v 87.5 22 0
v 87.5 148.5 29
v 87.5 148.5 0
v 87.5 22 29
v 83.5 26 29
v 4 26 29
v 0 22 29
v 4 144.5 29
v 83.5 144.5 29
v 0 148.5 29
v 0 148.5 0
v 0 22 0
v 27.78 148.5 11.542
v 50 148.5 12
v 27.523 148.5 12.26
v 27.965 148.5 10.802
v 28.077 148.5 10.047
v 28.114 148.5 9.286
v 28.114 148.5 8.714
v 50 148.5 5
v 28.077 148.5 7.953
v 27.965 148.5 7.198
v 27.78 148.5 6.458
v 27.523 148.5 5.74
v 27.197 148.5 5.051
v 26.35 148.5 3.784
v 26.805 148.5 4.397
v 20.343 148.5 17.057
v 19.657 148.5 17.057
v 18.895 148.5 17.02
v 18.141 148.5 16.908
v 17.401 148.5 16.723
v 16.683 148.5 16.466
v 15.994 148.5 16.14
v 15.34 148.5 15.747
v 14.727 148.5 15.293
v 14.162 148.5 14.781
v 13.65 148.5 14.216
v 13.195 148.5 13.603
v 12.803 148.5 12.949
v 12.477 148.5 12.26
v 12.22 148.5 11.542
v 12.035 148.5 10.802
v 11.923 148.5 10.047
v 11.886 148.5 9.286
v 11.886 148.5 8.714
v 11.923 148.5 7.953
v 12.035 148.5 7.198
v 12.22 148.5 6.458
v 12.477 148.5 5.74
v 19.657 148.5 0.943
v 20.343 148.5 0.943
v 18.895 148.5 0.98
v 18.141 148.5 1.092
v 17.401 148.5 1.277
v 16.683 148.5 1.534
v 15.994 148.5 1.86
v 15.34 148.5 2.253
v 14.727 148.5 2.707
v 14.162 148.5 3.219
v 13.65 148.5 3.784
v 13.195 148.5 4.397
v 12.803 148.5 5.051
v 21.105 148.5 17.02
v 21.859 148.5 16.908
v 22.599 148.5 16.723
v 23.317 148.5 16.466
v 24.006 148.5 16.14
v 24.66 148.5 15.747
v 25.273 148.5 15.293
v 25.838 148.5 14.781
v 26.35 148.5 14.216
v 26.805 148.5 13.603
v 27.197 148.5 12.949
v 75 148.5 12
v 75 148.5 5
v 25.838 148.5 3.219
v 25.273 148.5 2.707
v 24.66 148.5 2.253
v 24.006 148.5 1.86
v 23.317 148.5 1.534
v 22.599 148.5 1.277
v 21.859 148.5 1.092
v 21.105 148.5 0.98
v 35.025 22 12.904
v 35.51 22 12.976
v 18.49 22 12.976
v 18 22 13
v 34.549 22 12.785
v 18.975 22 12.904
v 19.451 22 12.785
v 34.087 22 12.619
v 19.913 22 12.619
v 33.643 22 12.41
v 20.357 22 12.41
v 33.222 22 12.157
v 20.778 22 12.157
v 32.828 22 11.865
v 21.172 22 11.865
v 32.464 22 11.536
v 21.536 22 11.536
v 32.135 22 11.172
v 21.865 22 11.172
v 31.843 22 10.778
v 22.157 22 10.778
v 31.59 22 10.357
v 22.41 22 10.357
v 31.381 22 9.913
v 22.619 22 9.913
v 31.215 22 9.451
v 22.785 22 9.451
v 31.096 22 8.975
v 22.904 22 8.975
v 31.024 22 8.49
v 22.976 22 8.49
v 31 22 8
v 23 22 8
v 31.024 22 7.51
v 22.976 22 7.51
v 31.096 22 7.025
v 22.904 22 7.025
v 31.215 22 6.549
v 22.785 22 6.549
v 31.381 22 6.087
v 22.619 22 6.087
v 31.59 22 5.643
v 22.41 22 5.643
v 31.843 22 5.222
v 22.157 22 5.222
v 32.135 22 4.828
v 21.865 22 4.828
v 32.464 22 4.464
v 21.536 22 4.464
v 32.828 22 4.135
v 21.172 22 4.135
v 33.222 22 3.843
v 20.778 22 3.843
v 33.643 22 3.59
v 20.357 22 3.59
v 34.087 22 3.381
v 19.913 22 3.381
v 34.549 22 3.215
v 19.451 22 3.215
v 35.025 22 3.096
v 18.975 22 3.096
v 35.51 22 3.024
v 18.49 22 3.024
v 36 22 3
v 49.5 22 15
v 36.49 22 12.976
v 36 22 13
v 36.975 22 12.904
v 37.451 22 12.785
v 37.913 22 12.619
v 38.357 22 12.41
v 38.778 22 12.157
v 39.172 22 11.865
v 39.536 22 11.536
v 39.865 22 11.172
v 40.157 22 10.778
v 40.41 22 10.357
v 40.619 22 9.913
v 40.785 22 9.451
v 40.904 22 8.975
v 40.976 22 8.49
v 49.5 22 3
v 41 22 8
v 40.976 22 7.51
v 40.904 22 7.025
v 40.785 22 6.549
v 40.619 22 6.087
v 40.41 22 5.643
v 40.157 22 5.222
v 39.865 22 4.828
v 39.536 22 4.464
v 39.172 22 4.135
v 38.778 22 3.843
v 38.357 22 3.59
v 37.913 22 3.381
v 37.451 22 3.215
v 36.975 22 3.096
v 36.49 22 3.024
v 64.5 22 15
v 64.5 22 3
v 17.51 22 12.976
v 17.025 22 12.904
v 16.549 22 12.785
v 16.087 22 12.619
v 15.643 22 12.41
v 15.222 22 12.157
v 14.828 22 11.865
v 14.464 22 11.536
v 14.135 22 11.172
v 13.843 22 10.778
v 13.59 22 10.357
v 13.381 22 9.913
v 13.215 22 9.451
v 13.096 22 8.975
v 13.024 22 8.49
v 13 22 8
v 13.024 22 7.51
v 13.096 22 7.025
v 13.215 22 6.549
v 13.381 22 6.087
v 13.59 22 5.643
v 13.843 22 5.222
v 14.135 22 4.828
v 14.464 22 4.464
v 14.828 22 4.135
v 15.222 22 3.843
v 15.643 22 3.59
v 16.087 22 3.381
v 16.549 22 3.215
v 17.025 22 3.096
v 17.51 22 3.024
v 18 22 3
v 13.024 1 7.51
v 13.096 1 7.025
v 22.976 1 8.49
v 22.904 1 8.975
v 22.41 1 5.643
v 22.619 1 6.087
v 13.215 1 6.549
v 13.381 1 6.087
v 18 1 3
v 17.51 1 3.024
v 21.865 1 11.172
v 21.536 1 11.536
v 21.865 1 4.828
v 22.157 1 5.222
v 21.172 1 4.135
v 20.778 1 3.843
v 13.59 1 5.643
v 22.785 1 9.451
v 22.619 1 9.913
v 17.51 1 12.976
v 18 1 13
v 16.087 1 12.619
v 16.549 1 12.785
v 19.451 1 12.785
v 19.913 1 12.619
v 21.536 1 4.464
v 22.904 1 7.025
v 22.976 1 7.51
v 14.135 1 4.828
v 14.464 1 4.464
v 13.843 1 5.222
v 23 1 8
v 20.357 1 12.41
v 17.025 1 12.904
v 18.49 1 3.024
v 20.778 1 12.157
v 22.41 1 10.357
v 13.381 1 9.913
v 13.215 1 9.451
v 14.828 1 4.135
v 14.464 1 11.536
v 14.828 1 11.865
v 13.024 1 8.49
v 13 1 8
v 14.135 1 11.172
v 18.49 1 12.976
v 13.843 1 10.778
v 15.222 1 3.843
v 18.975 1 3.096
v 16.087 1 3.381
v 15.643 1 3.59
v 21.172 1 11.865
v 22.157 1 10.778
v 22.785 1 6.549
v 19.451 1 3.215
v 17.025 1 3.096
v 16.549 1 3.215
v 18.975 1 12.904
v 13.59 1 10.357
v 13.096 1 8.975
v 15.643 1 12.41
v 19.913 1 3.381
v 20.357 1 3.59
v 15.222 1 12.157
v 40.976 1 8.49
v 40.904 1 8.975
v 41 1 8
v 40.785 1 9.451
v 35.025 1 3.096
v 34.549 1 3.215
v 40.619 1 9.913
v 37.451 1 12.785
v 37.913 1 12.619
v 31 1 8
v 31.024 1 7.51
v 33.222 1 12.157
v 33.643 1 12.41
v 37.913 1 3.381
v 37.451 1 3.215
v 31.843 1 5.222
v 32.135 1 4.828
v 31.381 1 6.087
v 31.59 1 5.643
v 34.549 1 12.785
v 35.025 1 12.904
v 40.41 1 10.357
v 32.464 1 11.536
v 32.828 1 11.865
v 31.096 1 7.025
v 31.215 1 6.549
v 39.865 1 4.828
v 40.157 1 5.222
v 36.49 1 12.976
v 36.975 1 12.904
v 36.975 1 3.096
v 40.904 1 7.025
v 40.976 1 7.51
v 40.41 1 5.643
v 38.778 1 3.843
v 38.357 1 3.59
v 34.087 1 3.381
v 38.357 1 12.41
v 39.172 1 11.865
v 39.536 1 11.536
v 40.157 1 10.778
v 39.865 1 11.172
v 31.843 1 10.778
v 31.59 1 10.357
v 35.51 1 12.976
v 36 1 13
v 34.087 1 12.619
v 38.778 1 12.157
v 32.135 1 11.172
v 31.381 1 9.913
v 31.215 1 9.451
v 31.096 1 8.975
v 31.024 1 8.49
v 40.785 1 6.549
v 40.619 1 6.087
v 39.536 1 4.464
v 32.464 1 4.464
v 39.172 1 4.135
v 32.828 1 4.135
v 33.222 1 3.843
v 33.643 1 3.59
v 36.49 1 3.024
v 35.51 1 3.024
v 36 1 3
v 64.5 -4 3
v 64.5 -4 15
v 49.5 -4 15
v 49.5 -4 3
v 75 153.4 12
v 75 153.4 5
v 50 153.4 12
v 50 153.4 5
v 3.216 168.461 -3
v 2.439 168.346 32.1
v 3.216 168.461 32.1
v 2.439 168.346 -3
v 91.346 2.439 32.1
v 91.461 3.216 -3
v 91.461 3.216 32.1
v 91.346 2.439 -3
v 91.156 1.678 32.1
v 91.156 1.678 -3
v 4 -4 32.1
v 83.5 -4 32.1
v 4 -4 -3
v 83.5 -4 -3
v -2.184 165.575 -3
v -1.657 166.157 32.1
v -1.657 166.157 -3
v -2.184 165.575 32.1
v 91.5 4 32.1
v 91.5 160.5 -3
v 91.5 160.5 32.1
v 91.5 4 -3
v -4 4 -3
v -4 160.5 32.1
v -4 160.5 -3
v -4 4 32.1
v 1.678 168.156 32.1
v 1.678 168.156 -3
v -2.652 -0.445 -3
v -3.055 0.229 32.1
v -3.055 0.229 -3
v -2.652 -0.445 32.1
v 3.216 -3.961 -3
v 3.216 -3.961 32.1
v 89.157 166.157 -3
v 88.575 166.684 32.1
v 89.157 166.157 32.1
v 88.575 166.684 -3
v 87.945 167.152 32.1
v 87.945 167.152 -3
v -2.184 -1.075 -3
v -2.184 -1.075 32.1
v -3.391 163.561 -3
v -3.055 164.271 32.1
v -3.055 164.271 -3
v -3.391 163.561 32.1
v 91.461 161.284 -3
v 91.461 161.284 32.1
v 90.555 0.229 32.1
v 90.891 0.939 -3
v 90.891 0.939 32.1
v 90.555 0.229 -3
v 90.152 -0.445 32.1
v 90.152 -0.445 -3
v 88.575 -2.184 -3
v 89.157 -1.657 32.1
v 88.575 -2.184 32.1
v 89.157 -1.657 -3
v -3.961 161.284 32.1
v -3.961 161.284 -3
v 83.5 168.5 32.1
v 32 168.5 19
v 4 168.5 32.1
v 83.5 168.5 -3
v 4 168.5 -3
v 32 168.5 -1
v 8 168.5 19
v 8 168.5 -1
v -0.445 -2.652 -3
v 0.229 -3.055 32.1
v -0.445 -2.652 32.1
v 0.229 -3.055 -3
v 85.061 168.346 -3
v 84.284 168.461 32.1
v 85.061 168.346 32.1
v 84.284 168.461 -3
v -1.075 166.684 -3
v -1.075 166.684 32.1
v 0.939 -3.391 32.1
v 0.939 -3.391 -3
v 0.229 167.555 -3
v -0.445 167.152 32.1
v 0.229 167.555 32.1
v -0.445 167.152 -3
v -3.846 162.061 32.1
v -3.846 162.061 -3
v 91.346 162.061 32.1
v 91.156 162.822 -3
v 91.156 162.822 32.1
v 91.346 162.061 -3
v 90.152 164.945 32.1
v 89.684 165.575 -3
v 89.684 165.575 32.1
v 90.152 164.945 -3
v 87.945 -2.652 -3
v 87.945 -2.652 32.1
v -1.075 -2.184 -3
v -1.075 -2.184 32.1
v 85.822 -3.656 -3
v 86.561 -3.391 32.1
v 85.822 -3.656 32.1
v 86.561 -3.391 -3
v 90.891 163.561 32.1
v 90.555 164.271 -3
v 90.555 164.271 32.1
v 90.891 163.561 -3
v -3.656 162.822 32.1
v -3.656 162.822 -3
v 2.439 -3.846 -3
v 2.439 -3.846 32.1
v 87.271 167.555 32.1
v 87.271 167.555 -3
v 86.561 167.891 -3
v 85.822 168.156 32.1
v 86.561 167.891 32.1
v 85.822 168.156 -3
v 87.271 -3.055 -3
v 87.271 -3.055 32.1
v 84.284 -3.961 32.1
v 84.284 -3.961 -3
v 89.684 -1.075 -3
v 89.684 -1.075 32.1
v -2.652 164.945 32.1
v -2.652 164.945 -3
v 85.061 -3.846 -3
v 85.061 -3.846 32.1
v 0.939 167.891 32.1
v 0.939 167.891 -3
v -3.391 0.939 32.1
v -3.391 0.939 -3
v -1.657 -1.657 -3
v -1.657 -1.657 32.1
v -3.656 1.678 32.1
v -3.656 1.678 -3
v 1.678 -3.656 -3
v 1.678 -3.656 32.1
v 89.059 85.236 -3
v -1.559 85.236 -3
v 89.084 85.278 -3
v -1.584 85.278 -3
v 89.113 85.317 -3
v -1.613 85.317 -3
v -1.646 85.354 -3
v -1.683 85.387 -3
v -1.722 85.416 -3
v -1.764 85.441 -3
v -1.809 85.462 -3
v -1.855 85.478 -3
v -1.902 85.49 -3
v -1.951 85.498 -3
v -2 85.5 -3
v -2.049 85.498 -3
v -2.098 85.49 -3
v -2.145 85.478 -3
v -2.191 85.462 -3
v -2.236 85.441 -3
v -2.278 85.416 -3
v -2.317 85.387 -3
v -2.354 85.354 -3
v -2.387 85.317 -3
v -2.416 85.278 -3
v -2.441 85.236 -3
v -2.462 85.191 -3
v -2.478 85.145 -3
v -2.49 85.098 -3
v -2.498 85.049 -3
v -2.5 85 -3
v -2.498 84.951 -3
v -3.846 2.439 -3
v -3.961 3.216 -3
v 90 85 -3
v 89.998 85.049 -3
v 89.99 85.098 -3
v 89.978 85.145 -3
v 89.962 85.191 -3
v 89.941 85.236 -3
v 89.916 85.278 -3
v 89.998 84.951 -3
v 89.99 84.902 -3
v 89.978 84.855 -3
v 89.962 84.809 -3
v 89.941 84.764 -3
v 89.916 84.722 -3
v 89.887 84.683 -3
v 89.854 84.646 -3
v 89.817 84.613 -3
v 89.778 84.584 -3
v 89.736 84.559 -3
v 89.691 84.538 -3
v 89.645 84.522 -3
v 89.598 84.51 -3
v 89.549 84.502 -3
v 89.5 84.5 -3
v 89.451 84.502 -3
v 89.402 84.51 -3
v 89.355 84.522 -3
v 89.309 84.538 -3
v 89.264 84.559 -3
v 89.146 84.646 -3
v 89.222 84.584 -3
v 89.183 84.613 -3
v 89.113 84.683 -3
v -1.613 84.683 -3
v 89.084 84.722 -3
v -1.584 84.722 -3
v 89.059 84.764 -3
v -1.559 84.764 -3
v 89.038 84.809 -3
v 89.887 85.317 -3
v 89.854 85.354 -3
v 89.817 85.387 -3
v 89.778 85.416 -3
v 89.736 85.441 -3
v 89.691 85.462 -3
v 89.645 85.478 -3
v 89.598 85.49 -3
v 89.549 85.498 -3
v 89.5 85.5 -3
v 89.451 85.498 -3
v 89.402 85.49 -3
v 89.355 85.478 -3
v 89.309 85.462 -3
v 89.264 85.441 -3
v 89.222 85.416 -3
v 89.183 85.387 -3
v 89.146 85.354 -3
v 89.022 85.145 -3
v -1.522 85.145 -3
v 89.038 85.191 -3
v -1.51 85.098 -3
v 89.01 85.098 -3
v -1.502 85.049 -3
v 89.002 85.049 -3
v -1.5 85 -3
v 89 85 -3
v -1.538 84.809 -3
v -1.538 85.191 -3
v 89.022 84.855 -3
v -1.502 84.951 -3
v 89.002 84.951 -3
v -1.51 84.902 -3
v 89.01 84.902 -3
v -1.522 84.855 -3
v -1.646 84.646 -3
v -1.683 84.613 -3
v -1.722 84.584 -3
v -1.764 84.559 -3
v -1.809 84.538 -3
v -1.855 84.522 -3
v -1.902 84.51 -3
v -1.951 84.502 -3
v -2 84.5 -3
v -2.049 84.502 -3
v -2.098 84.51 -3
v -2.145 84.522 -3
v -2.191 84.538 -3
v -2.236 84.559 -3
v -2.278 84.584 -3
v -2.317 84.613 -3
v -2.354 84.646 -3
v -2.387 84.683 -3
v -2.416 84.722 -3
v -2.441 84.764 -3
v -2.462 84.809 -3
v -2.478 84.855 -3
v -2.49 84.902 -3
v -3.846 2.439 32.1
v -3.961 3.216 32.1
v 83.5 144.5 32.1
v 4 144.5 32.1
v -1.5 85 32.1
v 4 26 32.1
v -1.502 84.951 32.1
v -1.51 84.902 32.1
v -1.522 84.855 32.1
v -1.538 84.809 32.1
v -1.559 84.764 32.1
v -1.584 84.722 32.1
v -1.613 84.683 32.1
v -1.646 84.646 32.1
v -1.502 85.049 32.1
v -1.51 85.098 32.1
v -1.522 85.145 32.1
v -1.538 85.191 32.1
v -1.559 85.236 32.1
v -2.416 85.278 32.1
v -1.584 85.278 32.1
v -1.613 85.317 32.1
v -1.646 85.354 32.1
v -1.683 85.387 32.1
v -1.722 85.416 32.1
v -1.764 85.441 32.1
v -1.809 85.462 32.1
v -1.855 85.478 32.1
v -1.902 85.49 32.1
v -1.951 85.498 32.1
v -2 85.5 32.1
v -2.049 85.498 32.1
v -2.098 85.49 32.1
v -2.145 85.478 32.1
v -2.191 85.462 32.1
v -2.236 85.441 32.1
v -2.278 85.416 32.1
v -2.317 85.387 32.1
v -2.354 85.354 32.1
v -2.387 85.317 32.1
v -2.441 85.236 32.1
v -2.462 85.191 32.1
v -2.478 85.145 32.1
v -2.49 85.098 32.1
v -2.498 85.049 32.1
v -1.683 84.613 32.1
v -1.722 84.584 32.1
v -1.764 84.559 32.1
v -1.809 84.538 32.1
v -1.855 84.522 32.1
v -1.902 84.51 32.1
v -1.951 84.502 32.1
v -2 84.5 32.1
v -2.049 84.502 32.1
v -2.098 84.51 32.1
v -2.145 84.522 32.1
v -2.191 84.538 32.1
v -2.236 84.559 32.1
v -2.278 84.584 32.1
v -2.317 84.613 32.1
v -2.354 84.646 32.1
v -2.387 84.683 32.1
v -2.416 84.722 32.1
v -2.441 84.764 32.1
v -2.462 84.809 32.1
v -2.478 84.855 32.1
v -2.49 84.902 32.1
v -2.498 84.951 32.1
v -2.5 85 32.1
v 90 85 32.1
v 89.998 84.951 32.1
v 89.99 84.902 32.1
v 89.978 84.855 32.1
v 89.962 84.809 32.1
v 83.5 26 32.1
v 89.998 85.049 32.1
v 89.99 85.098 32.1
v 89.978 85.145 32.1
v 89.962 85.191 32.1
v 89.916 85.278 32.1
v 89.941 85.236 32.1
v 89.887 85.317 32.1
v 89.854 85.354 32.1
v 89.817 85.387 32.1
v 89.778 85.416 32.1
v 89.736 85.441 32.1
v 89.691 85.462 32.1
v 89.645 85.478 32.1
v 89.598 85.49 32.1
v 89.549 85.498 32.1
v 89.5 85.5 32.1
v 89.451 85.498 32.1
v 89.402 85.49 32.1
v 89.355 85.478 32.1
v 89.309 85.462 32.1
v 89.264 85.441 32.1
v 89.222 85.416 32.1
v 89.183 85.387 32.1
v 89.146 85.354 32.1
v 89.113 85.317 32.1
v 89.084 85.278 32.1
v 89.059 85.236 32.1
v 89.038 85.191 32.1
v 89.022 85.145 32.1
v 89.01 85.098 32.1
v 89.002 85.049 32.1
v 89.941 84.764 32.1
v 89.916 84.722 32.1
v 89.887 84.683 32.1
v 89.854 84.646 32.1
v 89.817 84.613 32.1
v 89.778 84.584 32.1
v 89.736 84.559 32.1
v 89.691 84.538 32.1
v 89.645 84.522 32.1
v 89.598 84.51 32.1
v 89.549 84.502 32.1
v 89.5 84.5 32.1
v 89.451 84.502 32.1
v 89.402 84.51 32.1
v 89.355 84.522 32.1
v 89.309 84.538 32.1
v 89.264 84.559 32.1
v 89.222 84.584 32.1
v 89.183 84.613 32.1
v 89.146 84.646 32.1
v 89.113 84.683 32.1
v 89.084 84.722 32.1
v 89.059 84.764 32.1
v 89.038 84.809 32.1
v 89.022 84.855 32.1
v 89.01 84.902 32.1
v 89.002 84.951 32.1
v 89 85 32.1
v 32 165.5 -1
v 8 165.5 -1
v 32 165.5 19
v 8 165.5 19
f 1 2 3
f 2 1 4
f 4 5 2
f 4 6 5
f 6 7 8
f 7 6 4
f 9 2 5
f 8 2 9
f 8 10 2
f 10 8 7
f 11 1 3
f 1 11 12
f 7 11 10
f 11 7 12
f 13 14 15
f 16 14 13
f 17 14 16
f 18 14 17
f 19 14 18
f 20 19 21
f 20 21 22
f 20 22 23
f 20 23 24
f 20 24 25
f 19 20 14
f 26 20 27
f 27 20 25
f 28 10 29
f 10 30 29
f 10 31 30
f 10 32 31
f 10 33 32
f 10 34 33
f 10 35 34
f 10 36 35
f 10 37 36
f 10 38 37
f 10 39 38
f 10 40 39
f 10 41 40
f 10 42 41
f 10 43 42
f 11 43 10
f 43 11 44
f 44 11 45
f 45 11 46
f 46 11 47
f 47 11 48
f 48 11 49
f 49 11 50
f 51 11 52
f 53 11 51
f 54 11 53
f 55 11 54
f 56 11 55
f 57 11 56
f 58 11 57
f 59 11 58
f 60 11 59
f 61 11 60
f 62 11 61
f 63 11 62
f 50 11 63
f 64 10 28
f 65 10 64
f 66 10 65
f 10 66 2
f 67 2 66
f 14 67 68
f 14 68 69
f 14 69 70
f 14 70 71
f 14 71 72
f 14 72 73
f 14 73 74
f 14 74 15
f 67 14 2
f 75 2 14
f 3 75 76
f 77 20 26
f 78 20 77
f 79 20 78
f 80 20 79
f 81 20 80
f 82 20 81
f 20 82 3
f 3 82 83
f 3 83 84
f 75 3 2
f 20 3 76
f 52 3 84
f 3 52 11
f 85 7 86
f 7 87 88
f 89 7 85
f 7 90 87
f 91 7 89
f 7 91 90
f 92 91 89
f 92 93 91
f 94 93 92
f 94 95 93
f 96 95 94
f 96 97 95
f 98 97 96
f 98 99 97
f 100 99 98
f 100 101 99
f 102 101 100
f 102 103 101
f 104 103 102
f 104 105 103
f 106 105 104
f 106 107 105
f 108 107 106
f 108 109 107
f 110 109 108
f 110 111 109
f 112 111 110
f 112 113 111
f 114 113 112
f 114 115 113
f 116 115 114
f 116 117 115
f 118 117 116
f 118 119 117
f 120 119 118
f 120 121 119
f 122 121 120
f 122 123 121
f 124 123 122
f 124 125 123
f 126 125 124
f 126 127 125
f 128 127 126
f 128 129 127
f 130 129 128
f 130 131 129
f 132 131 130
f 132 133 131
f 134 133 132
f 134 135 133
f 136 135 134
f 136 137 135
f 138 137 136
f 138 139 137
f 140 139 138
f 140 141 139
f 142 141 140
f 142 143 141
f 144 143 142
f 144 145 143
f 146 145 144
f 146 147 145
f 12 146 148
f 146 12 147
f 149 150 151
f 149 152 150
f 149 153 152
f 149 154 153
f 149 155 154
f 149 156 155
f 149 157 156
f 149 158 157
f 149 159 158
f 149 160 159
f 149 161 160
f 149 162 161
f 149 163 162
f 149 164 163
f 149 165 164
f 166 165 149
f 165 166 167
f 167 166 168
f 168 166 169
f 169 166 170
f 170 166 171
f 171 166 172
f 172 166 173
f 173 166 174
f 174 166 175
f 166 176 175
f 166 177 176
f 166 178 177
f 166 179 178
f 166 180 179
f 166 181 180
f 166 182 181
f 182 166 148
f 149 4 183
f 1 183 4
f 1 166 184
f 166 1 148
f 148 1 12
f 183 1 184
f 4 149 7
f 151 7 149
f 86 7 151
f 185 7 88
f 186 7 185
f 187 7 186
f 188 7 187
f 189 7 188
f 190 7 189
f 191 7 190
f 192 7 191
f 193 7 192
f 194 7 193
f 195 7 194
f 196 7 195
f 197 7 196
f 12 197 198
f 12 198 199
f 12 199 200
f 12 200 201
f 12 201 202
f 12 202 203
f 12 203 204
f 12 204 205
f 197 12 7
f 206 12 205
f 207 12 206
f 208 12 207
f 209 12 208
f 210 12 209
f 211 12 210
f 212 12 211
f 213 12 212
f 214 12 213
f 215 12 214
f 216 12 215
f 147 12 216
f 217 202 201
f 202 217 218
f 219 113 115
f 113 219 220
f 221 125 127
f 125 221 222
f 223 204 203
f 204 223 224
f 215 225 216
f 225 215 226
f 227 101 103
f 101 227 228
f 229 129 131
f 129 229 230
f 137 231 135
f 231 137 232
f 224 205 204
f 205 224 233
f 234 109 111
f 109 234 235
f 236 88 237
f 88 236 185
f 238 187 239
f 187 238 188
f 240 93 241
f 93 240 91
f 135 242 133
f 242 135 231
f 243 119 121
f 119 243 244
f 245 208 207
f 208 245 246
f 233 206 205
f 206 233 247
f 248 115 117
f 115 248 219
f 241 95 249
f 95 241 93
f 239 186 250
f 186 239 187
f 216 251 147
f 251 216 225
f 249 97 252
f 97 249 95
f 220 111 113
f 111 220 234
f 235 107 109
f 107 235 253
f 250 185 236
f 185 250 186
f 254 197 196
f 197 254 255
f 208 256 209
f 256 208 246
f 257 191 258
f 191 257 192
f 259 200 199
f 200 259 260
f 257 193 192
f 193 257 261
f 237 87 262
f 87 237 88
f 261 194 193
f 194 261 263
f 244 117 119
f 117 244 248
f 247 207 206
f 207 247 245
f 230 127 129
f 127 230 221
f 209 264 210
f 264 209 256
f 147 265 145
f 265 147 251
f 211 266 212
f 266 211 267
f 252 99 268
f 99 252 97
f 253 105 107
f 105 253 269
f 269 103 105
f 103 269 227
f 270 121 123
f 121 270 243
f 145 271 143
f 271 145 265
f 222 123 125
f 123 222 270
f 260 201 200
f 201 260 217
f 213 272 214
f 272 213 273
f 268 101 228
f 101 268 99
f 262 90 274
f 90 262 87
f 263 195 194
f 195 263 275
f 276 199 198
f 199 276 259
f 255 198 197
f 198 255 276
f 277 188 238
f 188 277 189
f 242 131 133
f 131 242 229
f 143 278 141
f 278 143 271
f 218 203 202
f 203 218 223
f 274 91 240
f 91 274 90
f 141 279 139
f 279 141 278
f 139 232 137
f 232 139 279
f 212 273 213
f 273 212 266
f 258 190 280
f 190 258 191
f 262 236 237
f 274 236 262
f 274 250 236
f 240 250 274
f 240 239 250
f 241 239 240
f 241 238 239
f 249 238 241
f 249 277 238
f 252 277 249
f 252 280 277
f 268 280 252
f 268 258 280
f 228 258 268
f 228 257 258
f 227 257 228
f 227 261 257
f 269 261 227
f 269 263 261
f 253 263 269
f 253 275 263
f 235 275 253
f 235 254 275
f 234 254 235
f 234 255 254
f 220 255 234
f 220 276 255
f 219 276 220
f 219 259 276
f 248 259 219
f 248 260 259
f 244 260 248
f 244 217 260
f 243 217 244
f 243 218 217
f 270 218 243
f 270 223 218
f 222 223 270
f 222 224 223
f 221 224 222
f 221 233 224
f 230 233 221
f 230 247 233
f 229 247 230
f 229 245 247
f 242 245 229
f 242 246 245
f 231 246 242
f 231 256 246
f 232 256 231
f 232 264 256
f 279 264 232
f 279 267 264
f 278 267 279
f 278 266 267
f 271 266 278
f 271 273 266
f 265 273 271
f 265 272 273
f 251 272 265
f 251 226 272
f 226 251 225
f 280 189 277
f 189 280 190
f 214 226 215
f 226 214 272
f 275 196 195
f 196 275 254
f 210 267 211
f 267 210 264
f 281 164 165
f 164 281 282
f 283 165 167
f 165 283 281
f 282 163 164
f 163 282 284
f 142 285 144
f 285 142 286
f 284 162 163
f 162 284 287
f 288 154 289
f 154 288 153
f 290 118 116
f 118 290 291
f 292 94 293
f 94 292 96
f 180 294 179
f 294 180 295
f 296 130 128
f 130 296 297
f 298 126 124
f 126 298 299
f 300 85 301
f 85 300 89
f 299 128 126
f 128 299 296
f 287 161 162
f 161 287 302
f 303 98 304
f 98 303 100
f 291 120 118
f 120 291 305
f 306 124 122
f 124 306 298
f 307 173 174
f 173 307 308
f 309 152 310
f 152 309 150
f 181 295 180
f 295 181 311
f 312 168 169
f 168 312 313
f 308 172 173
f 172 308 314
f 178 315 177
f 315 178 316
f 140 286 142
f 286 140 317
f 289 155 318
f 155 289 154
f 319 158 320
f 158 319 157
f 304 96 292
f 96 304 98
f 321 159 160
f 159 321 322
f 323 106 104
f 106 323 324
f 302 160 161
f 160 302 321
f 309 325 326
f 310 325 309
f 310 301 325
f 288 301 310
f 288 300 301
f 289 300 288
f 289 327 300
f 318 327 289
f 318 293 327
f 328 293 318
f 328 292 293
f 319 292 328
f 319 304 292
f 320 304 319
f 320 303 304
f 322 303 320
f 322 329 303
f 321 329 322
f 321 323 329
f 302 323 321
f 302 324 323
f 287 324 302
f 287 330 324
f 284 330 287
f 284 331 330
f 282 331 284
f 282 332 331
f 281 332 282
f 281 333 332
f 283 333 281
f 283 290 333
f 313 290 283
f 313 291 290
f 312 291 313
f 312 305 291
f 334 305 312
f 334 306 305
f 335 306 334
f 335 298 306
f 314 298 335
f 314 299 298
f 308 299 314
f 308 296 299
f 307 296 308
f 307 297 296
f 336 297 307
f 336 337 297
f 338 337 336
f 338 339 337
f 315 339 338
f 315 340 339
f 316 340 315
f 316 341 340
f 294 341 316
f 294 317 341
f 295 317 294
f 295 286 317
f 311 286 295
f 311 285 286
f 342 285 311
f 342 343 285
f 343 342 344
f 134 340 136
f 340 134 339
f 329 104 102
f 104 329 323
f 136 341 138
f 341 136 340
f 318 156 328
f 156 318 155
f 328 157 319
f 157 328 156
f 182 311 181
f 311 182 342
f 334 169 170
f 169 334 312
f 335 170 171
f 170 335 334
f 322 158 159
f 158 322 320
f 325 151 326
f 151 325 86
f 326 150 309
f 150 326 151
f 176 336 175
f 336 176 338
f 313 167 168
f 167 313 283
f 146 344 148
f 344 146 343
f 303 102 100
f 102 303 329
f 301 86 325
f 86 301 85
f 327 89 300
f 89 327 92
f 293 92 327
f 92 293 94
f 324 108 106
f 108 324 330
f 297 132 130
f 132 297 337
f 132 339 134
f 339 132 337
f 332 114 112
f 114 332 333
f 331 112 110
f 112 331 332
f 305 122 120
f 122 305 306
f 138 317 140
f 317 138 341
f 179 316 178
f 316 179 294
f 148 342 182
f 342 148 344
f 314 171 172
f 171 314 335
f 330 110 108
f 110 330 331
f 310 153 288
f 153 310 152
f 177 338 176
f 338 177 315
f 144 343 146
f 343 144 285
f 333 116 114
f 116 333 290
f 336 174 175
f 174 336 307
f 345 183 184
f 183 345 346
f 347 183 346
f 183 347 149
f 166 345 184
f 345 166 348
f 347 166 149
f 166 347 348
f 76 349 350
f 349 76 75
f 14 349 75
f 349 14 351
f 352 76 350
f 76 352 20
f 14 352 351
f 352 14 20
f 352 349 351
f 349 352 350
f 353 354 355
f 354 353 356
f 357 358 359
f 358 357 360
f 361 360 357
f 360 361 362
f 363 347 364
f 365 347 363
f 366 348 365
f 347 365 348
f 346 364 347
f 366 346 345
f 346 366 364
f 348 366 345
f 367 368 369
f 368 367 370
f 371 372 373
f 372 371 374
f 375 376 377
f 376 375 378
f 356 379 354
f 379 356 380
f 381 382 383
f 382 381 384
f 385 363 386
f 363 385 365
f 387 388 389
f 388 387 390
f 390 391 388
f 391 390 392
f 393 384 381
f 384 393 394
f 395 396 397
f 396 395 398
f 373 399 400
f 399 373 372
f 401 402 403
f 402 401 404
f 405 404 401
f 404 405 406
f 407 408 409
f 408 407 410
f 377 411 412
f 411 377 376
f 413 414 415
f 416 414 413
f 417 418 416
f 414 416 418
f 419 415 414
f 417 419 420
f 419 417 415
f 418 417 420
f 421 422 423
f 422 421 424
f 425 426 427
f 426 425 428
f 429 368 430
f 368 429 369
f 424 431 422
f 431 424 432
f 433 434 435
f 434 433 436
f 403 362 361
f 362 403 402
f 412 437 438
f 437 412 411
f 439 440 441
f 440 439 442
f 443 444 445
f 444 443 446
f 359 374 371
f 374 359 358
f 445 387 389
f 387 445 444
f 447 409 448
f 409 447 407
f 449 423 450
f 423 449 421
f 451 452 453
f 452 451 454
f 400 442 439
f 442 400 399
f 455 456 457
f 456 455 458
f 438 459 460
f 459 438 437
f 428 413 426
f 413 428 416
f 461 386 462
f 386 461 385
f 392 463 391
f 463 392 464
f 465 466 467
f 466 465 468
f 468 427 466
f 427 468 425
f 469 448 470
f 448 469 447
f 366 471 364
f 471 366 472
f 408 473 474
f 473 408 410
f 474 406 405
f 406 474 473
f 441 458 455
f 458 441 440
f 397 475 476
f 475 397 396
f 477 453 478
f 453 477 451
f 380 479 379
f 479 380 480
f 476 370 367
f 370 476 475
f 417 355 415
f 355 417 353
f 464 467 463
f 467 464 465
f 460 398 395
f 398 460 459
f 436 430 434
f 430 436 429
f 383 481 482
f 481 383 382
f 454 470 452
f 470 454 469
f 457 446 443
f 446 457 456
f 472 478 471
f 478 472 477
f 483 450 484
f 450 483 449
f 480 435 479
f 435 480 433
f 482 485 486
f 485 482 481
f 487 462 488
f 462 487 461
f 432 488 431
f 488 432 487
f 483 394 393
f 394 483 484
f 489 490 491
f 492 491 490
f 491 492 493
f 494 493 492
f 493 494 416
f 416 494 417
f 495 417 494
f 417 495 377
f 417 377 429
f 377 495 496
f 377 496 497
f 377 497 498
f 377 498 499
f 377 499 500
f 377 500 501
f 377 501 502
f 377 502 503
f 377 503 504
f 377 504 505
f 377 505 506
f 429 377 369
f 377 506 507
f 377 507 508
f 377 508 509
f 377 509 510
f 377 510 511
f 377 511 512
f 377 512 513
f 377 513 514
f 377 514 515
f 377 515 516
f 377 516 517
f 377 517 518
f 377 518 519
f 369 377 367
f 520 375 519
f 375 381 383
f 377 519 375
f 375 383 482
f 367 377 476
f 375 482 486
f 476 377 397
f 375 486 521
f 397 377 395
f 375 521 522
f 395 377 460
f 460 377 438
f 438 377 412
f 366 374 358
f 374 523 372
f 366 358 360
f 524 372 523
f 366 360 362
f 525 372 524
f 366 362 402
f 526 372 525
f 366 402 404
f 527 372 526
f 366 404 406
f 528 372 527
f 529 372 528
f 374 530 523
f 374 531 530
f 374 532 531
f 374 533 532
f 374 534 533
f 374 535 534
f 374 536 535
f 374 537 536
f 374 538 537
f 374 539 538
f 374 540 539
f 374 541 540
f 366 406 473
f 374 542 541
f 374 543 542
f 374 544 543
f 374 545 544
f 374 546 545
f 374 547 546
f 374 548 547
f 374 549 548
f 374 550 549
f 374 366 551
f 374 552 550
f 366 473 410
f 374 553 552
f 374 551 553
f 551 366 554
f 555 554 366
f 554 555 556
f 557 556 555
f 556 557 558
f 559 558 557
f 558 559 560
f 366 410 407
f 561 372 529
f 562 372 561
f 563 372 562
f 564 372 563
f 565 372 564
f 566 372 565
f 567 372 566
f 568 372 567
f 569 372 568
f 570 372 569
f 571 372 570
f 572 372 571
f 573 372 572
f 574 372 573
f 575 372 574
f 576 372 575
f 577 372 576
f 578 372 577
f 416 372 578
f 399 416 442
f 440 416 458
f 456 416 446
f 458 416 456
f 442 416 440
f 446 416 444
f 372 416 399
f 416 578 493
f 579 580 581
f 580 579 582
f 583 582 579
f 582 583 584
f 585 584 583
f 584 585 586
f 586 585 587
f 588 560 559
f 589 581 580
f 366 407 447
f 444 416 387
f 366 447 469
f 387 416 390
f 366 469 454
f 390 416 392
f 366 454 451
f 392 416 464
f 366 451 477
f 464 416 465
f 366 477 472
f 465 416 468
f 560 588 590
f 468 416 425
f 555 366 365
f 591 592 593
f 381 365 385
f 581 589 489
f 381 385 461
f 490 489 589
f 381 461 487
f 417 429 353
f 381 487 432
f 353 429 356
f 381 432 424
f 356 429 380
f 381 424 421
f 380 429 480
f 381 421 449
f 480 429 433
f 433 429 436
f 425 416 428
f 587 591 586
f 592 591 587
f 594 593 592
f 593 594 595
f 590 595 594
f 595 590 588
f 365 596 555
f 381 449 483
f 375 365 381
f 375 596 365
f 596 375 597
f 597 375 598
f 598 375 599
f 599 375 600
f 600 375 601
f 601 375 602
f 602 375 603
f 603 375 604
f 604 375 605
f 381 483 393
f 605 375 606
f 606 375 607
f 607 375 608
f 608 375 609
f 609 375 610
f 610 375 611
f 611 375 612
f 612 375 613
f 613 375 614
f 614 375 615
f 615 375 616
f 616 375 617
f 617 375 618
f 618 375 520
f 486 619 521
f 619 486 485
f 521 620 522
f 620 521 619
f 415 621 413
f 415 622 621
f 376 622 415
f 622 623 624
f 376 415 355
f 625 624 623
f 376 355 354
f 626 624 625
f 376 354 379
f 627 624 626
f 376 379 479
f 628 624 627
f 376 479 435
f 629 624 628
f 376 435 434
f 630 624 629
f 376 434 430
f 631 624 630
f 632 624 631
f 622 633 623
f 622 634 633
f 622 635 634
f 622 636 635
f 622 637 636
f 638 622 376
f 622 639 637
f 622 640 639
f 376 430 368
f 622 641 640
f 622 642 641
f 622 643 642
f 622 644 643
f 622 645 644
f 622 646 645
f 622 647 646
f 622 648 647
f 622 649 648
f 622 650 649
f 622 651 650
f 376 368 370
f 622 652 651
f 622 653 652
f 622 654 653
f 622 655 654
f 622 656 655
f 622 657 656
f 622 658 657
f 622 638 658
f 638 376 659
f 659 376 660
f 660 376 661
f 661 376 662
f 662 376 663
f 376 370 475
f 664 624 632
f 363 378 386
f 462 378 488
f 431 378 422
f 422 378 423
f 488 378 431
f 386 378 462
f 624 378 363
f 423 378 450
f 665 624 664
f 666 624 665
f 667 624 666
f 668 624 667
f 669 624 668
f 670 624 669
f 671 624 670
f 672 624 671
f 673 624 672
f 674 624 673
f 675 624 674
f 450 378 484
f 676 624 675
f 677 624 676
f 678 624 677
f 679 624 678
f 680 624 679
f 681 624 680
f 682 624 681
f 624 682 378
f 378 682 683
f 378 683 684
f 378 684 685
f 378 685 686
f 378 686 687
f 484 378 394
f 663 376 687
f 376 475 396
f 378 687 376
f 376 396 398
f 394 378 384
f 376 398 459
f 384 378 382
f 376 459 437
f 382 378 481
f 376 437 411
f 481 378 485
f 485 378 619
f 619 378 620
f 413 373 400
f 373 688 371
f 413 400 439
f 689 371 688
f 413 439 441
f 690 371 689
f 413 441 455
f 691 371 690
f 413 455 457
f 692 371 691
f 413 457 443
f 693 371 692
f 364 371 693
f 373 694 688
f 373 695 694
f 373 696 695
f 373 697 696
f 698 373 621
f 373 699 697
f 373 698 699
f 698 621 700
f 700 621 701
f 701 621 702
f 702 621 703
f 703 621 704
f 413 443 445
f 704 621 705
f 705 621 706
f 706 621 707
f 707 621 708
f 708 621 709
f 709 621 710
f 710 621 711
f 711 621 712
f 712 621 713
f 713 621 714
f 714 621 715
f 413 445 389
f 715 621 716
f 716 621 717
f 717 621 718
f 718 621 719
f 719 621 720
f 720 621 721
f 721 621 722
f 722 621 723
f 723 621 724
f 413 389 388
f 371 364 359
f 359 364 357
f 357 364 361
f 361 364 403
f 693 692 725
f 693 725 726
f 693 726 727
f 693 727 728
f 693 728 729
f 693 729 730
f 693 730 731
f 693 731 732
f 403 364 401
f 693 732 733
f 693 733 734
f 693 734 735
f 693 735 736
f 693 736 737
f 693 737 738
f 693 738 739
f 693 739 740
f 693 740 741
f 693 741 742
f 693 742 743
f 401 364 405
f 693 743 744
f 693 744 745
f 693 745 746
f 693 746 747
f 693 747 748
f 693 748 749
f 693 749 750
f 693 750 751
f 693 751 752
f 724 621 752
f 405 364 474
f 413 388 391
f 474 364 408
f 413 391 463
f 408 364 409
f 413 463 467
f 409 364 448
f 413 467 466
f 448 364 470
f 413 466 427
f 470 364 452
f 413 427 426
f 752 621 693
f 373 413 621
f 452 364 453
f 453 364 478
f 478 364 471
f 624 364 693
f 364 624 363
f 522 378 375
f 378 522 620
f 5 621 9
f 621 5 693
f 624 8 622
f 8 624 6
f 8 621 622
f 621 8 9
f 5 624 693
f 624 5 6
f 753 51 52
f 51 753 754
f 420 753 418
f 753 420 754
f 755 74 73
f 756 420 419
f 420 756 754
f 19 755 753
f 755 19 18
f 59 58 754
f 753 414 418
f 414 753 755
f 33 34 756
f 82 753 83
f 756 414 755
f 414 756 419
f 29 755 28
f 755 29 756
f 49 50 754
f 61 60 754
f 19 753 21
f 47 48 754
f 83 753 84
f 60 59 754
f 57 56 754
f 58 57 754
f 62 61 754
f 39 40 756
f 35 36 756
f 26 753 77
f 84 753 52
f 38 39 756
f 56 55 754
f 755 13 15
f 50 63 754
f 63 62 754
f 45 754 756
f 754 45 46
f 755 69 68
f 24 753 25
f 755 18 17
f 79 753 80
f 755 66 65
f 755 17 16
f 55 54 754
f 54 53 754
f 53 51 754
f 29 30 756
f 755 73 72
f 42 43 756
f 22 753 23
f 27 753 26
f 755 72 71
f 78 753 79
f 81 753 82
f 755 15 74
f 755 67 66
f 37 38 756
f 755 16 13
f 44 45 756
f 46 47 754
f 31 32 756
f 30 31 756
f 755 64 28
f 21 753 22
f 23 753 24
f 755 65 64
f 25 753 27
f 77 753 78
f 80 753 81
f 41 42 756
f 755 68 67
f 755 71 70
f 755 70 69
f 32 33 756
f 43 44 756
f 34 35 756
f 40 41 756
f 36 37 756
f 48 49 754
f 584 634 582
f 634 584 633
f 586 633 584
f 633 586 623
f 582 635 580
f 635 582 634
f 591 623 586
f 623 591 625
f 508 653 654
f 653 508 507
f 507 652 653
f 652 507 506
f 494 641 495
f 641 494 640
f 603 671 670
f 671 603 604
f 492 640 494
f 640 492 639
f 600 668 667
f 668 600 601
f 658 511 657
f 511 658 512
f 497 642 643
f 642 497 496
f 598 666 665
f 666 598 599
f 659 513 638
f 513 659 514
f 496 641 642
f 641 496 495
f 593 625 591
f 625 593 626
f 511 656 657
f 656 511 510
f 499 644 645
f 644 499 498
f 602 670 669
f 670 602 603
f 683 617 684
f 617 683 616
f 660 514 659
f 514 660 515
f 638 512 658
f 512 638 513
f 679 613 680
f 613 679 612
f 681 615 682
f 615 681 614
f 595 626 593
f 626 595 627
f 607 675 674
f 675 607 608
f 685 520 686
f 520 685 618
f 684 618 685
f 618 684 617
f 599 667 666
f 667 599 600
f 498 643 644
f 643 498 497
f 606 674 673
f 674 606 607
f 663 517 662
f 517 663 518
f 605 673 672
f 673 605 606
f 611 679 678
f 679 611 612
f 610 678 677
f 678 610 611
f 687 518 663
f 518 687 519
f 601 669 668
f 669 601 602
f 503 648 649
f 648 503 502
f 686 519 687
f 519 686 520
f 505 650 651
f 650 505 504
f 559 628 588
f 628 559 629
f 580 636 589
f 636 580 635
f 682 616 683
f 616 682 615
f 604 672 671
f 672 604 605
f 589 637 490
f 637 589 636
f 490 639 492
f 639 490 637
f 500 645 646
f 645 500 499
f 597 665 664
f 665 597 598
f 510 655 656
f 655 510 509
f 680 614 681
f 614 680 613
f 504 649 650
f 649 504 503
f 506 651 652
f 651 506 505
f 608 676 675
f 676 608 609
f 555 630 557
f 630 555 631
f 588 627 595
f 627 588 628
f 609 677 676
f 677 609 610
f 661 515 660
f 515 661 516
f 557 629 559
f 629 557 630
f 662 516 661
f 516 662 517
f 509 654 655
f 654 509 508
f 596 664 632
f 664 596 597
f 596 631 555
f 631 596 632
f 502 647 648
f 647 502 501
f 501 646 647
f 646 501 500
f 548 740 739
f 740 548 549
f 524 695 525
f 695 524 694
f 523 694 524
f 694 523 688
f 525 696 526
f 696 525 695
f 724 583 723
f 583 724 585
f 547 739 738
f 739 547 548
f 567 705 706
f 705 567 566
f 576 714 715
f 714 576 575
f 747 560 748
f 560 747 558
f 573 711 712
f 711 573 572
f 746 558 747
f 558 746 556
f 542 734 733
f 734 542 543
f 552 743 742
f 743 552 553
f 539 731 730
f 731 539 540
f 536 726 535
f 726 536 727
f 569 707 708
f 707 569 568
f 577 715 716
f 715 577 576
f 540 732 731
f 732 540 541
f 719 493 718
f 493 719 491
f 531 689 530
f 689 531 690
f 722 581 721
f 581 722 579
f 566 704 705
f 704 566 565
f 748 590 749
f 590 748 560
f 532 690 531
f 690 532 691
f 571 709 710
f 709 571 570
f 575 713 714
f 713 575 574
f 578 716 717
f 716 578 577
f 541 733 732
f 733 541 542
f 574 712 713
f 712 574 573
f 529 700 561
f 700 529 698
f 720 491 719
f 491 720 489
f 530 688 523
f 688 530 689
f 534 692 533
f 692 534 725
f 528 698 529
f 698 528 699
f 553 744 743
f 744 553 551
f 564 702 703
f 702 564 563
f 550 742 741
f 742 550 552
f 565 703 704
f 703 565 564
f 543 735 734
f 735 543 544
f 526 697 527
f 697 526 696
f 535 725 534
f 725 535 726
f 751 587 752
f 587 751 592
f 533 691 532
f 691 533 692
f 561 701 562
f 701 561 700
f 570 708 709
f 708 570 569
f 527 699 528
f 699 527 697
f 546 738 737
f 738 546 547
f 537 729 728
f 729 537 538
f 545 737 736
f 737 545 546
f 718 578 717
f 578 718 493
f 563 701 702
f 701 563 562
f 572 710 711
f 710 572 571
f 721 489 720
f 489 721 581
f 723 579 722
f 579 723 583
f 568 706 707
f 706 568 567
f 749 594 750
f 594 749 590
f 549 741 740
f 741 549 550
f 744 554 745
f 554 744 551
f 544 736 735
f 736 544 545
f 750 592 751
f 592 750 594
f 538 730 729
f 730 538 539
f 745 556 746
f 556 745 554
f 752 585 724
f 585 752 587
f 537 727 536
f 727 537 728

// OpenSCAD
//$fn= $preview ? 32:64;     // number of fragments, reduced resolution for preview.
$fn= 64;

//dimensions of portapack h2 with metal enclosure
pp_h=126.5;
pp_w=87.5;
pp_d=29;
//some other dimensions
rad_corner=8;   // radius at corners
add_d=6;        // add height depth
add_h_low=22;   // additional space below case
add_h_high=8;   // additional space above case


color("blue")
{
    difference()
    {
        case();
            //uncomment either interlock_a OR interlock_b
            //to create two parts that fit into each other
        //interlock_a();
        //interlock_b();
    }
}//end of blue



module interlock_a()
{
    difference(){
        translate([-10,-5,-6]) cube([pp_w+20,95,50]);
        translate([-10,90,-5]) cube([pp_w+20,86,50]);
        translate([-10,80,5.5]) cube([pp_w+20,15,19]);
    }    
}

module interlock_b()
{
    translate([-10,90,-5]) cube([pp_w+20,86,50]);
    translate([-10,80,5]) cube([pp_w+20,15,20]);
}

module case()
{
    difference()
    {
        translate([rad_corner/2,rad_corner/2,-add_d/2])minkowski(10)
        {
            cube([pp_w-rad_corner,pp_h+add_h_low+add_h_high,pp_d+add_d]);
            cylinder(r=rad_corner,h=0.1);
        }
    translate([4,add_h_low+4,0]) cube([pp_w-8,pp_h-8,pp_d+5]);
    translate([0,add_h_low,0])pp_h2();    
    translate([20,pp_h+25+18,9]) rotate([90,0,0])
        squ2rect(r_circ=8,h_circ=10,squareSize=[24,20,4],height=26.5);
    translate([-2,85,-3]) cylinder(r=.5,h=50,center=false);
    translate([89.5,85,-3]) cylinder(r=.5,h=50,center=false);
    }
};   


module pp_h2()
{
    cube([pp_w,pp_h,pp_d]);
    translate([18,1,8])rotate([90,0,0])cylinder(r=5,h=22);
    translate([36,1,8])rotate([90,0,0])cylinder(r=5,h=22);
    translate([57,-10,9])cube([10+5,40,7+5],center=true);
    translate([50,pp_h-.1,5])cube([25,5,7]);
};

module squ2rect(r_circ,h_circ,squareSize,height)
{
    hull()
    {
        translate([0,0,squareSize.z/2]) cube(squareSize, center=true);
        translate([0,0,height-h_circ]) cylinder(r=r_circ, h=h_circ, center=true);
    }
}
